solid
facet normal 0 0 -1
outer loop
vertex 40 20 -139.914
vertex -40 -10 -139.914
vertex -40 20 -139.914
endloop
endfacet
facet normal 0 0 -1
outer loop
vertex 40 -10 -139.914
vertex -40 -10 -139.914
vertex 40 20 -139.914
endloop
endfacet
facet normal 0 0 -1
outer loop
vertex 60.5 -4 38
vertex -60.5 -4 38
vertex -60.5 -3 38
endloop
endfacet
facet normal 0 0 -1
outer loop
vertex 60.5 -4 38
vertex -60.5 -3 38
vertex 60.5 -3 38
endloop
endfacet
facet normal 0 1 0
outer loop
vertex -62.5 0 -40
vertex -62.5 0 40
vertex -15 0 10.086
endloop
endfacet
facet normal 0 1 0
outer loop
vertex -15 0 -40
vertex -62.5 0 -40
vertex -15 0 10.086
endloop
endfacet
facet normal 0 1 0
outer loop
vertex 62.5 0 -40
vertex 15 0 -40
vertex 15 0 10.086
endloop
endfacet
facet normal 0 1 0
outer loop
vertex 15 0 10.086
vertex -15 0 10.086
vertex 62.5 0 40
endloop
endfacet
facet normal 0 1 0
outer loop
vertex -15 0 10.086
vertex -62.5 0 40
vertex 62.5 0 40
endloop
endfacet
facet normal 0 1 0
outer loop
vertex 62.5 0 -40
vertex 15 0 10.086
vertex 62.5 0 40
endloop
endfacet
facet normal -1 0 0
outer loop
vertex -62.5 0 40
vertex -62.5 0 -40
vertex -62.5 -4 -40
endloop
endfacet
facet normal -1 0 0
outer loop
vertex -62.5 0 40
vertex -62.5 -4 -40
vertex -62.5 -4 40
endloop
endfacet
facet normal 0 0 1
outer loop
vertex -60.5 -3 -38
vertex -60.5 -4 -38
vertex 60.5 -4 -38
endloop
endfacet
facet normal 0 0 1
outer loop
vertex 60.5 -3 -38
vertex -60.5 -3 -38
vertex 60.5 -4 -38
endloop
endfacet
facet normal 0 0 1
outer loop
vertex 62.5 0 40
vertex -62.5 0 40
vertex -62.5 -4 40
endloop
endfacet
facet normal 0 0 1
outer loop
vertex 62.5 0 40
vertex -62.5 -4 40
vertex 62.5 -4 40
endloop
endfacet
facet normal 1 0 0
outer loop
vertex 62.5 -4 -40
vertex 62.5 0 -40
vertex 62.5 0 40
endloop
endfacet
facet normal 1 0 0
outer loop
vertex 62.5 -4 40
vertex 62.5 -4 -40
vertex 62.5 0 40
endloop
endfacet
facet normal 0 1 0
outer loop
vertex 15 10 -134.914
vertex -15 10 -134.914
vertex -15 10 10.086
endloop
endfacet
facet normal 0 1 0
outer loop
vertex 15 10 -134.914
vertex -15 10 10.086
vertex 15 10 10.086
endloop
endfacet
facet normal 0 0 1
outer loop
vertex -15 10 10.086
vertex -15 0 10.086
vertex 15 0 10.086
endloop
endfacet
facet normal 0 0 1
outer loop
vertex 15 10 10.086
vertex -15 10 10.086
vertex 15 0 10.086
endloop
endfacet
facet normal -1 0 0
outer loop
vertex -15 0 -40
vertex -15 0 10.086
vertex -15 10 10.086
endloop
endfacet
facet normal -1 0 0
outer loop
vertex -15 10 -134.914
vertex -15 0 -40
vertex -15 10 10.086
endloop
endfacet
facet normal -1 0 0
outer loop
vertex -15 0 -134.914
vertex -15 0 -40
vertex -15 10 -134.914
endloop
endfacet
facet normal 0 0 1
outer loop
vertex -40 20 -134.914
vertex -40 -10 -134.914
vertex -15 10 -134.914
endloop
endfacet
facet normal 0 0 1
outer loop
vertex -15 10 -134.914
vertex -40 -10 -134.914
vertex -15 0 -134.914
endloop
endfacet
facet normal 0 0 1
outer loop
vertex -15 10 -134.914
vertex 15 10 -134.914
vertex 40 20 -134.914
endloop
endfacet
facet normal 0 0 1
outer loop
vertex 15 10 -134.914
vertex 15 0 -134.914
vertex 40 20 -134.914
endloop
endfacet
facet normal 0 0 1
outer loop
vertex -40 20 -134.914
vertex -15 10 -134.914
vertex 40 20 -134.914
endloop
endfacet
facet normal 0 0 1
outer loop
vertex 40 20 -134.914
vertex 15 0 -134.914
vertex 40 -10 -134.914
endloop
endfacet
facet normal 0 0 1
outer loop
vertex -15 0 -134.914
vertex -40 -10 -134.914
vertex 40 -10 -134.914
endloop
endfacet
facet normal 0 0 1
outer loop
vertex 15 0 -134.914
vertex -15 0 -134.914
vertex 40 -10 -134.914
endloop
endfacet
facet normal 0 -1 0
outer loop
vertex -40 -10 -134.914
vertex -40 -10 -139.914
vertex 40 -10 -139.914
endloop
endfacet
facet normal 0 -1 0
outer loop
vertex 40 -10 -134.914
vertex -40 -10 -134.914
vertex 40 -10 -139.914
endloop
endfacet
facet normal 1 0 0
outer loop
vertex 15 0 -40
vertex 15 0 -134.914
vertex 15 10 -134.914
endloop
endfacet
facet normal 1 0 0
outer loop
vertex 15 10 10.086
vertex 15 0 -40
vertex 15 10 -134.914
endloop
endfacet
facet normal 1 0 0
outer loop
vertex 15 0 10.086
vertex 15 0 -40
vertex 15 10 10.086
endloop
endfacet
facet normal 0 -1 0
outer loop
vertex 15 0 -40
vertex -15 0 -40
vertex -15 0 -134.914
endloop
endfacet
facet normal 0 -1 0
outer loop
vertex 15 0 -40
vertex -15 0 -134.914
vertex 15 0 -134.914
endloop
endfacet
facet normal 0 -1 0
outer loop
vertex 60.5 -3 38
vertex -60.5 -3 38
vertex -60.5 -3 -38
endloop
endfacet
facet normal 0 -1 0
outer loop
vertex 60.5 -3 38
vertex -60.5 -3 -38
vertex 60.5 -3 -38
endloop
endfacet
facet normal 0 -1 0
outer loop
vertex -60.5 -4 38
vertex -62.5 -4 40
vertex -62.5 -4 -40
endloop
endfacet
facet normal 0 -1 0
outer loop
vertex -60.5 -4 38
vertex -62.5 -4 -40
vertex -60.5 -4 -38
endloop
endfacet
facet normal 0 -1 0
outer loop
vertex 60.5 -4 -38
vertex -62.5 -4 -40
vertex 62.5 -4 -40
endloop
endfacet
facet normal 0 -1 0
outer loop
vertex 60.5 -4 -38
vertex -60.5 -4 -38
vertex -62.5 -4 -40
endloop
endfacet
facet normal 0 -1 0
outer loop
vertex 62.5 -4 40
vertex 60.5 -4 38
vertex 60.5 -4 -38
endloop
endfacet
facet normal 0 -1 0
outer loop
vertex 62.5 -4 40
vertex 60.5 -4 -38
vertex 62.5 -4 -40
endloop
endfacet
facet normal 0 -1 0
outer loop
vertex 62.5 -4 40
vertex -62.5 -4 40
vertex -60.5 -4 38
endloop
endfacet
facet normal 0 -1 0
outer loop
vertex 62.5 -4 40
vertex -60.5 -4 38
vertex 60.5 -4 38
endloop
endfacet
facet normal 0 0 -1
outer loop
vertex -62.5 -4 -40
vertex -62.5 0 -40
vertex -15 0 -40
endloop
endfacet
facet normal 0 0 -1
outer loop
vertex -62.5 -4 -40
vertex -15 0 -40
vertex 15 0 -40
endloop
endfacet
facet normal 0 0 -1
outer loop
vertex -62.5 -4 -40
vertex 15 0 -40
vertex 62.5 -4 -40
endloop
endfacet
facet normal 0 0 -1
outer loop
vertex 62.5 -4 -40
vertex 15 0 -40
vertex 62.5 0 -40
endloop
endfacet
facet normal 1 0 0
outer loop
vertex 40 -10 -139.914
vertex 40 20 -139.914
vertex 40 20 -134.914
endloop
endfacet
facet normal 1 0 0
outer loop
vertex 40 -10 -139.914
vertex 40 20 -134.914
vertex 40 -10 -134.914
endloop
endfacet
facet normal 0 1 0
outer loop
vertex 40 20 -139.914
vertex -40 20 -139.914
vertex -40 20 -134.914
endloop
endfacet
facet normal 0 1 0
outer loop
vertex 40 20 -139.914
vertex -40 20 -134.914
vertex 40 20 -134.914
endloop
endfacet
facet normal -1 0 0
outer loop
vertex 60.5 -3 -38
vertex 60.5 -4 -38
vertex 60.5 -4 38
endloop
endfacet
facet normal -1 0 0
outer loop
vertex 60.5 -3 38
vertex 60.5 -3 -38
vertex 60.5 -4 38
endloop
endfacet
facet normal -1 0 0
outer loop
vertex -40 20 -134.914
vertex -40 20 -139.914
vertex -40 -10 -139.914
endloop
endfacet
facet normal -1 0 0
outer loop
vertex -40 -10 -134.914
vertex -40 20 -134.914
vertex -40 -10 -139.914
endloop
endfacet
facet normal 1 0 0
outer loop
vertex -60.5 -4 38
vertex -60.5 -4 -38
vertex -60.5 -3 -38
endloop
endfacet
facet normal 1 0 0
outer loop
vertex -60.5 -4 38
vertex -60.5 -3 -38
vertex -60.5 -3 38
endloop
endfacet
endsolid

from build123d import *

# Parameters (mm, degrees)
F0_W     = 125
F0_H     = 80
F0_W_2   = 121
F0_H_2   = 76
F1_DEPTH = 4
F2_W     = 121
F2_H     = 76
F3_DEPTH = 1
F4_W     = 30
F4_H     = 101.913806
F4_H_2   = 48.086194
F5_DEPTH = 10
F6_W     = 80
F6_H     = 30
F6_W_2   = 30
F6_H_2   = 10
F7_DEPTH = 5


with BuildPart() as f1:
    # F0 (on Front) → F1 (new body)
    with BuildSketch(Plane.XZ):
        Rectangle(F0_W, F0_H)
        Rectangle(F0_W_2, F0_H_2, mode=Mode.SUBTRACT)
        Rectangle(F0_W_2, F0_H_2)
    extrude(amount=F1_DEPTH)

    # F2 (on face) → F3 (cut)
    with BuildSketch(Plane.XZ.offset(4)):
        Rectangle(F2_W, F2_H)
    extrude(amount=-F3_DEPTH, mode=Mode.SUBTRACT)

    # F4 (on face) → F5 (join)
    with BuildSketch(Plane.XZ):
        with Locations((0, -88.956903)):
            Rectangle(F4_W, F4_H)
        with Locations((0, -13.956903)):
            Rectangle(F4_W, F4_H_2)
    extrude(amount=-F5_DEPTH)

    # F6 (on face) → F7 (join)
    with BuildSketch(Plane(origin=(0, 0, -139.913806), x_dir=(1, 0, 0), z_dir=(0, 0, -1))):
        with Locations((0, -5)):
            Rectangle(F6_W, F6_H)
        with Locations((0, -5)):
            Rectangle(F6_W_2, F6_H_2, mode=Mode.SUBTRACT)
    extrude(amount=-F7_DEPTH)


solid = f1.part
